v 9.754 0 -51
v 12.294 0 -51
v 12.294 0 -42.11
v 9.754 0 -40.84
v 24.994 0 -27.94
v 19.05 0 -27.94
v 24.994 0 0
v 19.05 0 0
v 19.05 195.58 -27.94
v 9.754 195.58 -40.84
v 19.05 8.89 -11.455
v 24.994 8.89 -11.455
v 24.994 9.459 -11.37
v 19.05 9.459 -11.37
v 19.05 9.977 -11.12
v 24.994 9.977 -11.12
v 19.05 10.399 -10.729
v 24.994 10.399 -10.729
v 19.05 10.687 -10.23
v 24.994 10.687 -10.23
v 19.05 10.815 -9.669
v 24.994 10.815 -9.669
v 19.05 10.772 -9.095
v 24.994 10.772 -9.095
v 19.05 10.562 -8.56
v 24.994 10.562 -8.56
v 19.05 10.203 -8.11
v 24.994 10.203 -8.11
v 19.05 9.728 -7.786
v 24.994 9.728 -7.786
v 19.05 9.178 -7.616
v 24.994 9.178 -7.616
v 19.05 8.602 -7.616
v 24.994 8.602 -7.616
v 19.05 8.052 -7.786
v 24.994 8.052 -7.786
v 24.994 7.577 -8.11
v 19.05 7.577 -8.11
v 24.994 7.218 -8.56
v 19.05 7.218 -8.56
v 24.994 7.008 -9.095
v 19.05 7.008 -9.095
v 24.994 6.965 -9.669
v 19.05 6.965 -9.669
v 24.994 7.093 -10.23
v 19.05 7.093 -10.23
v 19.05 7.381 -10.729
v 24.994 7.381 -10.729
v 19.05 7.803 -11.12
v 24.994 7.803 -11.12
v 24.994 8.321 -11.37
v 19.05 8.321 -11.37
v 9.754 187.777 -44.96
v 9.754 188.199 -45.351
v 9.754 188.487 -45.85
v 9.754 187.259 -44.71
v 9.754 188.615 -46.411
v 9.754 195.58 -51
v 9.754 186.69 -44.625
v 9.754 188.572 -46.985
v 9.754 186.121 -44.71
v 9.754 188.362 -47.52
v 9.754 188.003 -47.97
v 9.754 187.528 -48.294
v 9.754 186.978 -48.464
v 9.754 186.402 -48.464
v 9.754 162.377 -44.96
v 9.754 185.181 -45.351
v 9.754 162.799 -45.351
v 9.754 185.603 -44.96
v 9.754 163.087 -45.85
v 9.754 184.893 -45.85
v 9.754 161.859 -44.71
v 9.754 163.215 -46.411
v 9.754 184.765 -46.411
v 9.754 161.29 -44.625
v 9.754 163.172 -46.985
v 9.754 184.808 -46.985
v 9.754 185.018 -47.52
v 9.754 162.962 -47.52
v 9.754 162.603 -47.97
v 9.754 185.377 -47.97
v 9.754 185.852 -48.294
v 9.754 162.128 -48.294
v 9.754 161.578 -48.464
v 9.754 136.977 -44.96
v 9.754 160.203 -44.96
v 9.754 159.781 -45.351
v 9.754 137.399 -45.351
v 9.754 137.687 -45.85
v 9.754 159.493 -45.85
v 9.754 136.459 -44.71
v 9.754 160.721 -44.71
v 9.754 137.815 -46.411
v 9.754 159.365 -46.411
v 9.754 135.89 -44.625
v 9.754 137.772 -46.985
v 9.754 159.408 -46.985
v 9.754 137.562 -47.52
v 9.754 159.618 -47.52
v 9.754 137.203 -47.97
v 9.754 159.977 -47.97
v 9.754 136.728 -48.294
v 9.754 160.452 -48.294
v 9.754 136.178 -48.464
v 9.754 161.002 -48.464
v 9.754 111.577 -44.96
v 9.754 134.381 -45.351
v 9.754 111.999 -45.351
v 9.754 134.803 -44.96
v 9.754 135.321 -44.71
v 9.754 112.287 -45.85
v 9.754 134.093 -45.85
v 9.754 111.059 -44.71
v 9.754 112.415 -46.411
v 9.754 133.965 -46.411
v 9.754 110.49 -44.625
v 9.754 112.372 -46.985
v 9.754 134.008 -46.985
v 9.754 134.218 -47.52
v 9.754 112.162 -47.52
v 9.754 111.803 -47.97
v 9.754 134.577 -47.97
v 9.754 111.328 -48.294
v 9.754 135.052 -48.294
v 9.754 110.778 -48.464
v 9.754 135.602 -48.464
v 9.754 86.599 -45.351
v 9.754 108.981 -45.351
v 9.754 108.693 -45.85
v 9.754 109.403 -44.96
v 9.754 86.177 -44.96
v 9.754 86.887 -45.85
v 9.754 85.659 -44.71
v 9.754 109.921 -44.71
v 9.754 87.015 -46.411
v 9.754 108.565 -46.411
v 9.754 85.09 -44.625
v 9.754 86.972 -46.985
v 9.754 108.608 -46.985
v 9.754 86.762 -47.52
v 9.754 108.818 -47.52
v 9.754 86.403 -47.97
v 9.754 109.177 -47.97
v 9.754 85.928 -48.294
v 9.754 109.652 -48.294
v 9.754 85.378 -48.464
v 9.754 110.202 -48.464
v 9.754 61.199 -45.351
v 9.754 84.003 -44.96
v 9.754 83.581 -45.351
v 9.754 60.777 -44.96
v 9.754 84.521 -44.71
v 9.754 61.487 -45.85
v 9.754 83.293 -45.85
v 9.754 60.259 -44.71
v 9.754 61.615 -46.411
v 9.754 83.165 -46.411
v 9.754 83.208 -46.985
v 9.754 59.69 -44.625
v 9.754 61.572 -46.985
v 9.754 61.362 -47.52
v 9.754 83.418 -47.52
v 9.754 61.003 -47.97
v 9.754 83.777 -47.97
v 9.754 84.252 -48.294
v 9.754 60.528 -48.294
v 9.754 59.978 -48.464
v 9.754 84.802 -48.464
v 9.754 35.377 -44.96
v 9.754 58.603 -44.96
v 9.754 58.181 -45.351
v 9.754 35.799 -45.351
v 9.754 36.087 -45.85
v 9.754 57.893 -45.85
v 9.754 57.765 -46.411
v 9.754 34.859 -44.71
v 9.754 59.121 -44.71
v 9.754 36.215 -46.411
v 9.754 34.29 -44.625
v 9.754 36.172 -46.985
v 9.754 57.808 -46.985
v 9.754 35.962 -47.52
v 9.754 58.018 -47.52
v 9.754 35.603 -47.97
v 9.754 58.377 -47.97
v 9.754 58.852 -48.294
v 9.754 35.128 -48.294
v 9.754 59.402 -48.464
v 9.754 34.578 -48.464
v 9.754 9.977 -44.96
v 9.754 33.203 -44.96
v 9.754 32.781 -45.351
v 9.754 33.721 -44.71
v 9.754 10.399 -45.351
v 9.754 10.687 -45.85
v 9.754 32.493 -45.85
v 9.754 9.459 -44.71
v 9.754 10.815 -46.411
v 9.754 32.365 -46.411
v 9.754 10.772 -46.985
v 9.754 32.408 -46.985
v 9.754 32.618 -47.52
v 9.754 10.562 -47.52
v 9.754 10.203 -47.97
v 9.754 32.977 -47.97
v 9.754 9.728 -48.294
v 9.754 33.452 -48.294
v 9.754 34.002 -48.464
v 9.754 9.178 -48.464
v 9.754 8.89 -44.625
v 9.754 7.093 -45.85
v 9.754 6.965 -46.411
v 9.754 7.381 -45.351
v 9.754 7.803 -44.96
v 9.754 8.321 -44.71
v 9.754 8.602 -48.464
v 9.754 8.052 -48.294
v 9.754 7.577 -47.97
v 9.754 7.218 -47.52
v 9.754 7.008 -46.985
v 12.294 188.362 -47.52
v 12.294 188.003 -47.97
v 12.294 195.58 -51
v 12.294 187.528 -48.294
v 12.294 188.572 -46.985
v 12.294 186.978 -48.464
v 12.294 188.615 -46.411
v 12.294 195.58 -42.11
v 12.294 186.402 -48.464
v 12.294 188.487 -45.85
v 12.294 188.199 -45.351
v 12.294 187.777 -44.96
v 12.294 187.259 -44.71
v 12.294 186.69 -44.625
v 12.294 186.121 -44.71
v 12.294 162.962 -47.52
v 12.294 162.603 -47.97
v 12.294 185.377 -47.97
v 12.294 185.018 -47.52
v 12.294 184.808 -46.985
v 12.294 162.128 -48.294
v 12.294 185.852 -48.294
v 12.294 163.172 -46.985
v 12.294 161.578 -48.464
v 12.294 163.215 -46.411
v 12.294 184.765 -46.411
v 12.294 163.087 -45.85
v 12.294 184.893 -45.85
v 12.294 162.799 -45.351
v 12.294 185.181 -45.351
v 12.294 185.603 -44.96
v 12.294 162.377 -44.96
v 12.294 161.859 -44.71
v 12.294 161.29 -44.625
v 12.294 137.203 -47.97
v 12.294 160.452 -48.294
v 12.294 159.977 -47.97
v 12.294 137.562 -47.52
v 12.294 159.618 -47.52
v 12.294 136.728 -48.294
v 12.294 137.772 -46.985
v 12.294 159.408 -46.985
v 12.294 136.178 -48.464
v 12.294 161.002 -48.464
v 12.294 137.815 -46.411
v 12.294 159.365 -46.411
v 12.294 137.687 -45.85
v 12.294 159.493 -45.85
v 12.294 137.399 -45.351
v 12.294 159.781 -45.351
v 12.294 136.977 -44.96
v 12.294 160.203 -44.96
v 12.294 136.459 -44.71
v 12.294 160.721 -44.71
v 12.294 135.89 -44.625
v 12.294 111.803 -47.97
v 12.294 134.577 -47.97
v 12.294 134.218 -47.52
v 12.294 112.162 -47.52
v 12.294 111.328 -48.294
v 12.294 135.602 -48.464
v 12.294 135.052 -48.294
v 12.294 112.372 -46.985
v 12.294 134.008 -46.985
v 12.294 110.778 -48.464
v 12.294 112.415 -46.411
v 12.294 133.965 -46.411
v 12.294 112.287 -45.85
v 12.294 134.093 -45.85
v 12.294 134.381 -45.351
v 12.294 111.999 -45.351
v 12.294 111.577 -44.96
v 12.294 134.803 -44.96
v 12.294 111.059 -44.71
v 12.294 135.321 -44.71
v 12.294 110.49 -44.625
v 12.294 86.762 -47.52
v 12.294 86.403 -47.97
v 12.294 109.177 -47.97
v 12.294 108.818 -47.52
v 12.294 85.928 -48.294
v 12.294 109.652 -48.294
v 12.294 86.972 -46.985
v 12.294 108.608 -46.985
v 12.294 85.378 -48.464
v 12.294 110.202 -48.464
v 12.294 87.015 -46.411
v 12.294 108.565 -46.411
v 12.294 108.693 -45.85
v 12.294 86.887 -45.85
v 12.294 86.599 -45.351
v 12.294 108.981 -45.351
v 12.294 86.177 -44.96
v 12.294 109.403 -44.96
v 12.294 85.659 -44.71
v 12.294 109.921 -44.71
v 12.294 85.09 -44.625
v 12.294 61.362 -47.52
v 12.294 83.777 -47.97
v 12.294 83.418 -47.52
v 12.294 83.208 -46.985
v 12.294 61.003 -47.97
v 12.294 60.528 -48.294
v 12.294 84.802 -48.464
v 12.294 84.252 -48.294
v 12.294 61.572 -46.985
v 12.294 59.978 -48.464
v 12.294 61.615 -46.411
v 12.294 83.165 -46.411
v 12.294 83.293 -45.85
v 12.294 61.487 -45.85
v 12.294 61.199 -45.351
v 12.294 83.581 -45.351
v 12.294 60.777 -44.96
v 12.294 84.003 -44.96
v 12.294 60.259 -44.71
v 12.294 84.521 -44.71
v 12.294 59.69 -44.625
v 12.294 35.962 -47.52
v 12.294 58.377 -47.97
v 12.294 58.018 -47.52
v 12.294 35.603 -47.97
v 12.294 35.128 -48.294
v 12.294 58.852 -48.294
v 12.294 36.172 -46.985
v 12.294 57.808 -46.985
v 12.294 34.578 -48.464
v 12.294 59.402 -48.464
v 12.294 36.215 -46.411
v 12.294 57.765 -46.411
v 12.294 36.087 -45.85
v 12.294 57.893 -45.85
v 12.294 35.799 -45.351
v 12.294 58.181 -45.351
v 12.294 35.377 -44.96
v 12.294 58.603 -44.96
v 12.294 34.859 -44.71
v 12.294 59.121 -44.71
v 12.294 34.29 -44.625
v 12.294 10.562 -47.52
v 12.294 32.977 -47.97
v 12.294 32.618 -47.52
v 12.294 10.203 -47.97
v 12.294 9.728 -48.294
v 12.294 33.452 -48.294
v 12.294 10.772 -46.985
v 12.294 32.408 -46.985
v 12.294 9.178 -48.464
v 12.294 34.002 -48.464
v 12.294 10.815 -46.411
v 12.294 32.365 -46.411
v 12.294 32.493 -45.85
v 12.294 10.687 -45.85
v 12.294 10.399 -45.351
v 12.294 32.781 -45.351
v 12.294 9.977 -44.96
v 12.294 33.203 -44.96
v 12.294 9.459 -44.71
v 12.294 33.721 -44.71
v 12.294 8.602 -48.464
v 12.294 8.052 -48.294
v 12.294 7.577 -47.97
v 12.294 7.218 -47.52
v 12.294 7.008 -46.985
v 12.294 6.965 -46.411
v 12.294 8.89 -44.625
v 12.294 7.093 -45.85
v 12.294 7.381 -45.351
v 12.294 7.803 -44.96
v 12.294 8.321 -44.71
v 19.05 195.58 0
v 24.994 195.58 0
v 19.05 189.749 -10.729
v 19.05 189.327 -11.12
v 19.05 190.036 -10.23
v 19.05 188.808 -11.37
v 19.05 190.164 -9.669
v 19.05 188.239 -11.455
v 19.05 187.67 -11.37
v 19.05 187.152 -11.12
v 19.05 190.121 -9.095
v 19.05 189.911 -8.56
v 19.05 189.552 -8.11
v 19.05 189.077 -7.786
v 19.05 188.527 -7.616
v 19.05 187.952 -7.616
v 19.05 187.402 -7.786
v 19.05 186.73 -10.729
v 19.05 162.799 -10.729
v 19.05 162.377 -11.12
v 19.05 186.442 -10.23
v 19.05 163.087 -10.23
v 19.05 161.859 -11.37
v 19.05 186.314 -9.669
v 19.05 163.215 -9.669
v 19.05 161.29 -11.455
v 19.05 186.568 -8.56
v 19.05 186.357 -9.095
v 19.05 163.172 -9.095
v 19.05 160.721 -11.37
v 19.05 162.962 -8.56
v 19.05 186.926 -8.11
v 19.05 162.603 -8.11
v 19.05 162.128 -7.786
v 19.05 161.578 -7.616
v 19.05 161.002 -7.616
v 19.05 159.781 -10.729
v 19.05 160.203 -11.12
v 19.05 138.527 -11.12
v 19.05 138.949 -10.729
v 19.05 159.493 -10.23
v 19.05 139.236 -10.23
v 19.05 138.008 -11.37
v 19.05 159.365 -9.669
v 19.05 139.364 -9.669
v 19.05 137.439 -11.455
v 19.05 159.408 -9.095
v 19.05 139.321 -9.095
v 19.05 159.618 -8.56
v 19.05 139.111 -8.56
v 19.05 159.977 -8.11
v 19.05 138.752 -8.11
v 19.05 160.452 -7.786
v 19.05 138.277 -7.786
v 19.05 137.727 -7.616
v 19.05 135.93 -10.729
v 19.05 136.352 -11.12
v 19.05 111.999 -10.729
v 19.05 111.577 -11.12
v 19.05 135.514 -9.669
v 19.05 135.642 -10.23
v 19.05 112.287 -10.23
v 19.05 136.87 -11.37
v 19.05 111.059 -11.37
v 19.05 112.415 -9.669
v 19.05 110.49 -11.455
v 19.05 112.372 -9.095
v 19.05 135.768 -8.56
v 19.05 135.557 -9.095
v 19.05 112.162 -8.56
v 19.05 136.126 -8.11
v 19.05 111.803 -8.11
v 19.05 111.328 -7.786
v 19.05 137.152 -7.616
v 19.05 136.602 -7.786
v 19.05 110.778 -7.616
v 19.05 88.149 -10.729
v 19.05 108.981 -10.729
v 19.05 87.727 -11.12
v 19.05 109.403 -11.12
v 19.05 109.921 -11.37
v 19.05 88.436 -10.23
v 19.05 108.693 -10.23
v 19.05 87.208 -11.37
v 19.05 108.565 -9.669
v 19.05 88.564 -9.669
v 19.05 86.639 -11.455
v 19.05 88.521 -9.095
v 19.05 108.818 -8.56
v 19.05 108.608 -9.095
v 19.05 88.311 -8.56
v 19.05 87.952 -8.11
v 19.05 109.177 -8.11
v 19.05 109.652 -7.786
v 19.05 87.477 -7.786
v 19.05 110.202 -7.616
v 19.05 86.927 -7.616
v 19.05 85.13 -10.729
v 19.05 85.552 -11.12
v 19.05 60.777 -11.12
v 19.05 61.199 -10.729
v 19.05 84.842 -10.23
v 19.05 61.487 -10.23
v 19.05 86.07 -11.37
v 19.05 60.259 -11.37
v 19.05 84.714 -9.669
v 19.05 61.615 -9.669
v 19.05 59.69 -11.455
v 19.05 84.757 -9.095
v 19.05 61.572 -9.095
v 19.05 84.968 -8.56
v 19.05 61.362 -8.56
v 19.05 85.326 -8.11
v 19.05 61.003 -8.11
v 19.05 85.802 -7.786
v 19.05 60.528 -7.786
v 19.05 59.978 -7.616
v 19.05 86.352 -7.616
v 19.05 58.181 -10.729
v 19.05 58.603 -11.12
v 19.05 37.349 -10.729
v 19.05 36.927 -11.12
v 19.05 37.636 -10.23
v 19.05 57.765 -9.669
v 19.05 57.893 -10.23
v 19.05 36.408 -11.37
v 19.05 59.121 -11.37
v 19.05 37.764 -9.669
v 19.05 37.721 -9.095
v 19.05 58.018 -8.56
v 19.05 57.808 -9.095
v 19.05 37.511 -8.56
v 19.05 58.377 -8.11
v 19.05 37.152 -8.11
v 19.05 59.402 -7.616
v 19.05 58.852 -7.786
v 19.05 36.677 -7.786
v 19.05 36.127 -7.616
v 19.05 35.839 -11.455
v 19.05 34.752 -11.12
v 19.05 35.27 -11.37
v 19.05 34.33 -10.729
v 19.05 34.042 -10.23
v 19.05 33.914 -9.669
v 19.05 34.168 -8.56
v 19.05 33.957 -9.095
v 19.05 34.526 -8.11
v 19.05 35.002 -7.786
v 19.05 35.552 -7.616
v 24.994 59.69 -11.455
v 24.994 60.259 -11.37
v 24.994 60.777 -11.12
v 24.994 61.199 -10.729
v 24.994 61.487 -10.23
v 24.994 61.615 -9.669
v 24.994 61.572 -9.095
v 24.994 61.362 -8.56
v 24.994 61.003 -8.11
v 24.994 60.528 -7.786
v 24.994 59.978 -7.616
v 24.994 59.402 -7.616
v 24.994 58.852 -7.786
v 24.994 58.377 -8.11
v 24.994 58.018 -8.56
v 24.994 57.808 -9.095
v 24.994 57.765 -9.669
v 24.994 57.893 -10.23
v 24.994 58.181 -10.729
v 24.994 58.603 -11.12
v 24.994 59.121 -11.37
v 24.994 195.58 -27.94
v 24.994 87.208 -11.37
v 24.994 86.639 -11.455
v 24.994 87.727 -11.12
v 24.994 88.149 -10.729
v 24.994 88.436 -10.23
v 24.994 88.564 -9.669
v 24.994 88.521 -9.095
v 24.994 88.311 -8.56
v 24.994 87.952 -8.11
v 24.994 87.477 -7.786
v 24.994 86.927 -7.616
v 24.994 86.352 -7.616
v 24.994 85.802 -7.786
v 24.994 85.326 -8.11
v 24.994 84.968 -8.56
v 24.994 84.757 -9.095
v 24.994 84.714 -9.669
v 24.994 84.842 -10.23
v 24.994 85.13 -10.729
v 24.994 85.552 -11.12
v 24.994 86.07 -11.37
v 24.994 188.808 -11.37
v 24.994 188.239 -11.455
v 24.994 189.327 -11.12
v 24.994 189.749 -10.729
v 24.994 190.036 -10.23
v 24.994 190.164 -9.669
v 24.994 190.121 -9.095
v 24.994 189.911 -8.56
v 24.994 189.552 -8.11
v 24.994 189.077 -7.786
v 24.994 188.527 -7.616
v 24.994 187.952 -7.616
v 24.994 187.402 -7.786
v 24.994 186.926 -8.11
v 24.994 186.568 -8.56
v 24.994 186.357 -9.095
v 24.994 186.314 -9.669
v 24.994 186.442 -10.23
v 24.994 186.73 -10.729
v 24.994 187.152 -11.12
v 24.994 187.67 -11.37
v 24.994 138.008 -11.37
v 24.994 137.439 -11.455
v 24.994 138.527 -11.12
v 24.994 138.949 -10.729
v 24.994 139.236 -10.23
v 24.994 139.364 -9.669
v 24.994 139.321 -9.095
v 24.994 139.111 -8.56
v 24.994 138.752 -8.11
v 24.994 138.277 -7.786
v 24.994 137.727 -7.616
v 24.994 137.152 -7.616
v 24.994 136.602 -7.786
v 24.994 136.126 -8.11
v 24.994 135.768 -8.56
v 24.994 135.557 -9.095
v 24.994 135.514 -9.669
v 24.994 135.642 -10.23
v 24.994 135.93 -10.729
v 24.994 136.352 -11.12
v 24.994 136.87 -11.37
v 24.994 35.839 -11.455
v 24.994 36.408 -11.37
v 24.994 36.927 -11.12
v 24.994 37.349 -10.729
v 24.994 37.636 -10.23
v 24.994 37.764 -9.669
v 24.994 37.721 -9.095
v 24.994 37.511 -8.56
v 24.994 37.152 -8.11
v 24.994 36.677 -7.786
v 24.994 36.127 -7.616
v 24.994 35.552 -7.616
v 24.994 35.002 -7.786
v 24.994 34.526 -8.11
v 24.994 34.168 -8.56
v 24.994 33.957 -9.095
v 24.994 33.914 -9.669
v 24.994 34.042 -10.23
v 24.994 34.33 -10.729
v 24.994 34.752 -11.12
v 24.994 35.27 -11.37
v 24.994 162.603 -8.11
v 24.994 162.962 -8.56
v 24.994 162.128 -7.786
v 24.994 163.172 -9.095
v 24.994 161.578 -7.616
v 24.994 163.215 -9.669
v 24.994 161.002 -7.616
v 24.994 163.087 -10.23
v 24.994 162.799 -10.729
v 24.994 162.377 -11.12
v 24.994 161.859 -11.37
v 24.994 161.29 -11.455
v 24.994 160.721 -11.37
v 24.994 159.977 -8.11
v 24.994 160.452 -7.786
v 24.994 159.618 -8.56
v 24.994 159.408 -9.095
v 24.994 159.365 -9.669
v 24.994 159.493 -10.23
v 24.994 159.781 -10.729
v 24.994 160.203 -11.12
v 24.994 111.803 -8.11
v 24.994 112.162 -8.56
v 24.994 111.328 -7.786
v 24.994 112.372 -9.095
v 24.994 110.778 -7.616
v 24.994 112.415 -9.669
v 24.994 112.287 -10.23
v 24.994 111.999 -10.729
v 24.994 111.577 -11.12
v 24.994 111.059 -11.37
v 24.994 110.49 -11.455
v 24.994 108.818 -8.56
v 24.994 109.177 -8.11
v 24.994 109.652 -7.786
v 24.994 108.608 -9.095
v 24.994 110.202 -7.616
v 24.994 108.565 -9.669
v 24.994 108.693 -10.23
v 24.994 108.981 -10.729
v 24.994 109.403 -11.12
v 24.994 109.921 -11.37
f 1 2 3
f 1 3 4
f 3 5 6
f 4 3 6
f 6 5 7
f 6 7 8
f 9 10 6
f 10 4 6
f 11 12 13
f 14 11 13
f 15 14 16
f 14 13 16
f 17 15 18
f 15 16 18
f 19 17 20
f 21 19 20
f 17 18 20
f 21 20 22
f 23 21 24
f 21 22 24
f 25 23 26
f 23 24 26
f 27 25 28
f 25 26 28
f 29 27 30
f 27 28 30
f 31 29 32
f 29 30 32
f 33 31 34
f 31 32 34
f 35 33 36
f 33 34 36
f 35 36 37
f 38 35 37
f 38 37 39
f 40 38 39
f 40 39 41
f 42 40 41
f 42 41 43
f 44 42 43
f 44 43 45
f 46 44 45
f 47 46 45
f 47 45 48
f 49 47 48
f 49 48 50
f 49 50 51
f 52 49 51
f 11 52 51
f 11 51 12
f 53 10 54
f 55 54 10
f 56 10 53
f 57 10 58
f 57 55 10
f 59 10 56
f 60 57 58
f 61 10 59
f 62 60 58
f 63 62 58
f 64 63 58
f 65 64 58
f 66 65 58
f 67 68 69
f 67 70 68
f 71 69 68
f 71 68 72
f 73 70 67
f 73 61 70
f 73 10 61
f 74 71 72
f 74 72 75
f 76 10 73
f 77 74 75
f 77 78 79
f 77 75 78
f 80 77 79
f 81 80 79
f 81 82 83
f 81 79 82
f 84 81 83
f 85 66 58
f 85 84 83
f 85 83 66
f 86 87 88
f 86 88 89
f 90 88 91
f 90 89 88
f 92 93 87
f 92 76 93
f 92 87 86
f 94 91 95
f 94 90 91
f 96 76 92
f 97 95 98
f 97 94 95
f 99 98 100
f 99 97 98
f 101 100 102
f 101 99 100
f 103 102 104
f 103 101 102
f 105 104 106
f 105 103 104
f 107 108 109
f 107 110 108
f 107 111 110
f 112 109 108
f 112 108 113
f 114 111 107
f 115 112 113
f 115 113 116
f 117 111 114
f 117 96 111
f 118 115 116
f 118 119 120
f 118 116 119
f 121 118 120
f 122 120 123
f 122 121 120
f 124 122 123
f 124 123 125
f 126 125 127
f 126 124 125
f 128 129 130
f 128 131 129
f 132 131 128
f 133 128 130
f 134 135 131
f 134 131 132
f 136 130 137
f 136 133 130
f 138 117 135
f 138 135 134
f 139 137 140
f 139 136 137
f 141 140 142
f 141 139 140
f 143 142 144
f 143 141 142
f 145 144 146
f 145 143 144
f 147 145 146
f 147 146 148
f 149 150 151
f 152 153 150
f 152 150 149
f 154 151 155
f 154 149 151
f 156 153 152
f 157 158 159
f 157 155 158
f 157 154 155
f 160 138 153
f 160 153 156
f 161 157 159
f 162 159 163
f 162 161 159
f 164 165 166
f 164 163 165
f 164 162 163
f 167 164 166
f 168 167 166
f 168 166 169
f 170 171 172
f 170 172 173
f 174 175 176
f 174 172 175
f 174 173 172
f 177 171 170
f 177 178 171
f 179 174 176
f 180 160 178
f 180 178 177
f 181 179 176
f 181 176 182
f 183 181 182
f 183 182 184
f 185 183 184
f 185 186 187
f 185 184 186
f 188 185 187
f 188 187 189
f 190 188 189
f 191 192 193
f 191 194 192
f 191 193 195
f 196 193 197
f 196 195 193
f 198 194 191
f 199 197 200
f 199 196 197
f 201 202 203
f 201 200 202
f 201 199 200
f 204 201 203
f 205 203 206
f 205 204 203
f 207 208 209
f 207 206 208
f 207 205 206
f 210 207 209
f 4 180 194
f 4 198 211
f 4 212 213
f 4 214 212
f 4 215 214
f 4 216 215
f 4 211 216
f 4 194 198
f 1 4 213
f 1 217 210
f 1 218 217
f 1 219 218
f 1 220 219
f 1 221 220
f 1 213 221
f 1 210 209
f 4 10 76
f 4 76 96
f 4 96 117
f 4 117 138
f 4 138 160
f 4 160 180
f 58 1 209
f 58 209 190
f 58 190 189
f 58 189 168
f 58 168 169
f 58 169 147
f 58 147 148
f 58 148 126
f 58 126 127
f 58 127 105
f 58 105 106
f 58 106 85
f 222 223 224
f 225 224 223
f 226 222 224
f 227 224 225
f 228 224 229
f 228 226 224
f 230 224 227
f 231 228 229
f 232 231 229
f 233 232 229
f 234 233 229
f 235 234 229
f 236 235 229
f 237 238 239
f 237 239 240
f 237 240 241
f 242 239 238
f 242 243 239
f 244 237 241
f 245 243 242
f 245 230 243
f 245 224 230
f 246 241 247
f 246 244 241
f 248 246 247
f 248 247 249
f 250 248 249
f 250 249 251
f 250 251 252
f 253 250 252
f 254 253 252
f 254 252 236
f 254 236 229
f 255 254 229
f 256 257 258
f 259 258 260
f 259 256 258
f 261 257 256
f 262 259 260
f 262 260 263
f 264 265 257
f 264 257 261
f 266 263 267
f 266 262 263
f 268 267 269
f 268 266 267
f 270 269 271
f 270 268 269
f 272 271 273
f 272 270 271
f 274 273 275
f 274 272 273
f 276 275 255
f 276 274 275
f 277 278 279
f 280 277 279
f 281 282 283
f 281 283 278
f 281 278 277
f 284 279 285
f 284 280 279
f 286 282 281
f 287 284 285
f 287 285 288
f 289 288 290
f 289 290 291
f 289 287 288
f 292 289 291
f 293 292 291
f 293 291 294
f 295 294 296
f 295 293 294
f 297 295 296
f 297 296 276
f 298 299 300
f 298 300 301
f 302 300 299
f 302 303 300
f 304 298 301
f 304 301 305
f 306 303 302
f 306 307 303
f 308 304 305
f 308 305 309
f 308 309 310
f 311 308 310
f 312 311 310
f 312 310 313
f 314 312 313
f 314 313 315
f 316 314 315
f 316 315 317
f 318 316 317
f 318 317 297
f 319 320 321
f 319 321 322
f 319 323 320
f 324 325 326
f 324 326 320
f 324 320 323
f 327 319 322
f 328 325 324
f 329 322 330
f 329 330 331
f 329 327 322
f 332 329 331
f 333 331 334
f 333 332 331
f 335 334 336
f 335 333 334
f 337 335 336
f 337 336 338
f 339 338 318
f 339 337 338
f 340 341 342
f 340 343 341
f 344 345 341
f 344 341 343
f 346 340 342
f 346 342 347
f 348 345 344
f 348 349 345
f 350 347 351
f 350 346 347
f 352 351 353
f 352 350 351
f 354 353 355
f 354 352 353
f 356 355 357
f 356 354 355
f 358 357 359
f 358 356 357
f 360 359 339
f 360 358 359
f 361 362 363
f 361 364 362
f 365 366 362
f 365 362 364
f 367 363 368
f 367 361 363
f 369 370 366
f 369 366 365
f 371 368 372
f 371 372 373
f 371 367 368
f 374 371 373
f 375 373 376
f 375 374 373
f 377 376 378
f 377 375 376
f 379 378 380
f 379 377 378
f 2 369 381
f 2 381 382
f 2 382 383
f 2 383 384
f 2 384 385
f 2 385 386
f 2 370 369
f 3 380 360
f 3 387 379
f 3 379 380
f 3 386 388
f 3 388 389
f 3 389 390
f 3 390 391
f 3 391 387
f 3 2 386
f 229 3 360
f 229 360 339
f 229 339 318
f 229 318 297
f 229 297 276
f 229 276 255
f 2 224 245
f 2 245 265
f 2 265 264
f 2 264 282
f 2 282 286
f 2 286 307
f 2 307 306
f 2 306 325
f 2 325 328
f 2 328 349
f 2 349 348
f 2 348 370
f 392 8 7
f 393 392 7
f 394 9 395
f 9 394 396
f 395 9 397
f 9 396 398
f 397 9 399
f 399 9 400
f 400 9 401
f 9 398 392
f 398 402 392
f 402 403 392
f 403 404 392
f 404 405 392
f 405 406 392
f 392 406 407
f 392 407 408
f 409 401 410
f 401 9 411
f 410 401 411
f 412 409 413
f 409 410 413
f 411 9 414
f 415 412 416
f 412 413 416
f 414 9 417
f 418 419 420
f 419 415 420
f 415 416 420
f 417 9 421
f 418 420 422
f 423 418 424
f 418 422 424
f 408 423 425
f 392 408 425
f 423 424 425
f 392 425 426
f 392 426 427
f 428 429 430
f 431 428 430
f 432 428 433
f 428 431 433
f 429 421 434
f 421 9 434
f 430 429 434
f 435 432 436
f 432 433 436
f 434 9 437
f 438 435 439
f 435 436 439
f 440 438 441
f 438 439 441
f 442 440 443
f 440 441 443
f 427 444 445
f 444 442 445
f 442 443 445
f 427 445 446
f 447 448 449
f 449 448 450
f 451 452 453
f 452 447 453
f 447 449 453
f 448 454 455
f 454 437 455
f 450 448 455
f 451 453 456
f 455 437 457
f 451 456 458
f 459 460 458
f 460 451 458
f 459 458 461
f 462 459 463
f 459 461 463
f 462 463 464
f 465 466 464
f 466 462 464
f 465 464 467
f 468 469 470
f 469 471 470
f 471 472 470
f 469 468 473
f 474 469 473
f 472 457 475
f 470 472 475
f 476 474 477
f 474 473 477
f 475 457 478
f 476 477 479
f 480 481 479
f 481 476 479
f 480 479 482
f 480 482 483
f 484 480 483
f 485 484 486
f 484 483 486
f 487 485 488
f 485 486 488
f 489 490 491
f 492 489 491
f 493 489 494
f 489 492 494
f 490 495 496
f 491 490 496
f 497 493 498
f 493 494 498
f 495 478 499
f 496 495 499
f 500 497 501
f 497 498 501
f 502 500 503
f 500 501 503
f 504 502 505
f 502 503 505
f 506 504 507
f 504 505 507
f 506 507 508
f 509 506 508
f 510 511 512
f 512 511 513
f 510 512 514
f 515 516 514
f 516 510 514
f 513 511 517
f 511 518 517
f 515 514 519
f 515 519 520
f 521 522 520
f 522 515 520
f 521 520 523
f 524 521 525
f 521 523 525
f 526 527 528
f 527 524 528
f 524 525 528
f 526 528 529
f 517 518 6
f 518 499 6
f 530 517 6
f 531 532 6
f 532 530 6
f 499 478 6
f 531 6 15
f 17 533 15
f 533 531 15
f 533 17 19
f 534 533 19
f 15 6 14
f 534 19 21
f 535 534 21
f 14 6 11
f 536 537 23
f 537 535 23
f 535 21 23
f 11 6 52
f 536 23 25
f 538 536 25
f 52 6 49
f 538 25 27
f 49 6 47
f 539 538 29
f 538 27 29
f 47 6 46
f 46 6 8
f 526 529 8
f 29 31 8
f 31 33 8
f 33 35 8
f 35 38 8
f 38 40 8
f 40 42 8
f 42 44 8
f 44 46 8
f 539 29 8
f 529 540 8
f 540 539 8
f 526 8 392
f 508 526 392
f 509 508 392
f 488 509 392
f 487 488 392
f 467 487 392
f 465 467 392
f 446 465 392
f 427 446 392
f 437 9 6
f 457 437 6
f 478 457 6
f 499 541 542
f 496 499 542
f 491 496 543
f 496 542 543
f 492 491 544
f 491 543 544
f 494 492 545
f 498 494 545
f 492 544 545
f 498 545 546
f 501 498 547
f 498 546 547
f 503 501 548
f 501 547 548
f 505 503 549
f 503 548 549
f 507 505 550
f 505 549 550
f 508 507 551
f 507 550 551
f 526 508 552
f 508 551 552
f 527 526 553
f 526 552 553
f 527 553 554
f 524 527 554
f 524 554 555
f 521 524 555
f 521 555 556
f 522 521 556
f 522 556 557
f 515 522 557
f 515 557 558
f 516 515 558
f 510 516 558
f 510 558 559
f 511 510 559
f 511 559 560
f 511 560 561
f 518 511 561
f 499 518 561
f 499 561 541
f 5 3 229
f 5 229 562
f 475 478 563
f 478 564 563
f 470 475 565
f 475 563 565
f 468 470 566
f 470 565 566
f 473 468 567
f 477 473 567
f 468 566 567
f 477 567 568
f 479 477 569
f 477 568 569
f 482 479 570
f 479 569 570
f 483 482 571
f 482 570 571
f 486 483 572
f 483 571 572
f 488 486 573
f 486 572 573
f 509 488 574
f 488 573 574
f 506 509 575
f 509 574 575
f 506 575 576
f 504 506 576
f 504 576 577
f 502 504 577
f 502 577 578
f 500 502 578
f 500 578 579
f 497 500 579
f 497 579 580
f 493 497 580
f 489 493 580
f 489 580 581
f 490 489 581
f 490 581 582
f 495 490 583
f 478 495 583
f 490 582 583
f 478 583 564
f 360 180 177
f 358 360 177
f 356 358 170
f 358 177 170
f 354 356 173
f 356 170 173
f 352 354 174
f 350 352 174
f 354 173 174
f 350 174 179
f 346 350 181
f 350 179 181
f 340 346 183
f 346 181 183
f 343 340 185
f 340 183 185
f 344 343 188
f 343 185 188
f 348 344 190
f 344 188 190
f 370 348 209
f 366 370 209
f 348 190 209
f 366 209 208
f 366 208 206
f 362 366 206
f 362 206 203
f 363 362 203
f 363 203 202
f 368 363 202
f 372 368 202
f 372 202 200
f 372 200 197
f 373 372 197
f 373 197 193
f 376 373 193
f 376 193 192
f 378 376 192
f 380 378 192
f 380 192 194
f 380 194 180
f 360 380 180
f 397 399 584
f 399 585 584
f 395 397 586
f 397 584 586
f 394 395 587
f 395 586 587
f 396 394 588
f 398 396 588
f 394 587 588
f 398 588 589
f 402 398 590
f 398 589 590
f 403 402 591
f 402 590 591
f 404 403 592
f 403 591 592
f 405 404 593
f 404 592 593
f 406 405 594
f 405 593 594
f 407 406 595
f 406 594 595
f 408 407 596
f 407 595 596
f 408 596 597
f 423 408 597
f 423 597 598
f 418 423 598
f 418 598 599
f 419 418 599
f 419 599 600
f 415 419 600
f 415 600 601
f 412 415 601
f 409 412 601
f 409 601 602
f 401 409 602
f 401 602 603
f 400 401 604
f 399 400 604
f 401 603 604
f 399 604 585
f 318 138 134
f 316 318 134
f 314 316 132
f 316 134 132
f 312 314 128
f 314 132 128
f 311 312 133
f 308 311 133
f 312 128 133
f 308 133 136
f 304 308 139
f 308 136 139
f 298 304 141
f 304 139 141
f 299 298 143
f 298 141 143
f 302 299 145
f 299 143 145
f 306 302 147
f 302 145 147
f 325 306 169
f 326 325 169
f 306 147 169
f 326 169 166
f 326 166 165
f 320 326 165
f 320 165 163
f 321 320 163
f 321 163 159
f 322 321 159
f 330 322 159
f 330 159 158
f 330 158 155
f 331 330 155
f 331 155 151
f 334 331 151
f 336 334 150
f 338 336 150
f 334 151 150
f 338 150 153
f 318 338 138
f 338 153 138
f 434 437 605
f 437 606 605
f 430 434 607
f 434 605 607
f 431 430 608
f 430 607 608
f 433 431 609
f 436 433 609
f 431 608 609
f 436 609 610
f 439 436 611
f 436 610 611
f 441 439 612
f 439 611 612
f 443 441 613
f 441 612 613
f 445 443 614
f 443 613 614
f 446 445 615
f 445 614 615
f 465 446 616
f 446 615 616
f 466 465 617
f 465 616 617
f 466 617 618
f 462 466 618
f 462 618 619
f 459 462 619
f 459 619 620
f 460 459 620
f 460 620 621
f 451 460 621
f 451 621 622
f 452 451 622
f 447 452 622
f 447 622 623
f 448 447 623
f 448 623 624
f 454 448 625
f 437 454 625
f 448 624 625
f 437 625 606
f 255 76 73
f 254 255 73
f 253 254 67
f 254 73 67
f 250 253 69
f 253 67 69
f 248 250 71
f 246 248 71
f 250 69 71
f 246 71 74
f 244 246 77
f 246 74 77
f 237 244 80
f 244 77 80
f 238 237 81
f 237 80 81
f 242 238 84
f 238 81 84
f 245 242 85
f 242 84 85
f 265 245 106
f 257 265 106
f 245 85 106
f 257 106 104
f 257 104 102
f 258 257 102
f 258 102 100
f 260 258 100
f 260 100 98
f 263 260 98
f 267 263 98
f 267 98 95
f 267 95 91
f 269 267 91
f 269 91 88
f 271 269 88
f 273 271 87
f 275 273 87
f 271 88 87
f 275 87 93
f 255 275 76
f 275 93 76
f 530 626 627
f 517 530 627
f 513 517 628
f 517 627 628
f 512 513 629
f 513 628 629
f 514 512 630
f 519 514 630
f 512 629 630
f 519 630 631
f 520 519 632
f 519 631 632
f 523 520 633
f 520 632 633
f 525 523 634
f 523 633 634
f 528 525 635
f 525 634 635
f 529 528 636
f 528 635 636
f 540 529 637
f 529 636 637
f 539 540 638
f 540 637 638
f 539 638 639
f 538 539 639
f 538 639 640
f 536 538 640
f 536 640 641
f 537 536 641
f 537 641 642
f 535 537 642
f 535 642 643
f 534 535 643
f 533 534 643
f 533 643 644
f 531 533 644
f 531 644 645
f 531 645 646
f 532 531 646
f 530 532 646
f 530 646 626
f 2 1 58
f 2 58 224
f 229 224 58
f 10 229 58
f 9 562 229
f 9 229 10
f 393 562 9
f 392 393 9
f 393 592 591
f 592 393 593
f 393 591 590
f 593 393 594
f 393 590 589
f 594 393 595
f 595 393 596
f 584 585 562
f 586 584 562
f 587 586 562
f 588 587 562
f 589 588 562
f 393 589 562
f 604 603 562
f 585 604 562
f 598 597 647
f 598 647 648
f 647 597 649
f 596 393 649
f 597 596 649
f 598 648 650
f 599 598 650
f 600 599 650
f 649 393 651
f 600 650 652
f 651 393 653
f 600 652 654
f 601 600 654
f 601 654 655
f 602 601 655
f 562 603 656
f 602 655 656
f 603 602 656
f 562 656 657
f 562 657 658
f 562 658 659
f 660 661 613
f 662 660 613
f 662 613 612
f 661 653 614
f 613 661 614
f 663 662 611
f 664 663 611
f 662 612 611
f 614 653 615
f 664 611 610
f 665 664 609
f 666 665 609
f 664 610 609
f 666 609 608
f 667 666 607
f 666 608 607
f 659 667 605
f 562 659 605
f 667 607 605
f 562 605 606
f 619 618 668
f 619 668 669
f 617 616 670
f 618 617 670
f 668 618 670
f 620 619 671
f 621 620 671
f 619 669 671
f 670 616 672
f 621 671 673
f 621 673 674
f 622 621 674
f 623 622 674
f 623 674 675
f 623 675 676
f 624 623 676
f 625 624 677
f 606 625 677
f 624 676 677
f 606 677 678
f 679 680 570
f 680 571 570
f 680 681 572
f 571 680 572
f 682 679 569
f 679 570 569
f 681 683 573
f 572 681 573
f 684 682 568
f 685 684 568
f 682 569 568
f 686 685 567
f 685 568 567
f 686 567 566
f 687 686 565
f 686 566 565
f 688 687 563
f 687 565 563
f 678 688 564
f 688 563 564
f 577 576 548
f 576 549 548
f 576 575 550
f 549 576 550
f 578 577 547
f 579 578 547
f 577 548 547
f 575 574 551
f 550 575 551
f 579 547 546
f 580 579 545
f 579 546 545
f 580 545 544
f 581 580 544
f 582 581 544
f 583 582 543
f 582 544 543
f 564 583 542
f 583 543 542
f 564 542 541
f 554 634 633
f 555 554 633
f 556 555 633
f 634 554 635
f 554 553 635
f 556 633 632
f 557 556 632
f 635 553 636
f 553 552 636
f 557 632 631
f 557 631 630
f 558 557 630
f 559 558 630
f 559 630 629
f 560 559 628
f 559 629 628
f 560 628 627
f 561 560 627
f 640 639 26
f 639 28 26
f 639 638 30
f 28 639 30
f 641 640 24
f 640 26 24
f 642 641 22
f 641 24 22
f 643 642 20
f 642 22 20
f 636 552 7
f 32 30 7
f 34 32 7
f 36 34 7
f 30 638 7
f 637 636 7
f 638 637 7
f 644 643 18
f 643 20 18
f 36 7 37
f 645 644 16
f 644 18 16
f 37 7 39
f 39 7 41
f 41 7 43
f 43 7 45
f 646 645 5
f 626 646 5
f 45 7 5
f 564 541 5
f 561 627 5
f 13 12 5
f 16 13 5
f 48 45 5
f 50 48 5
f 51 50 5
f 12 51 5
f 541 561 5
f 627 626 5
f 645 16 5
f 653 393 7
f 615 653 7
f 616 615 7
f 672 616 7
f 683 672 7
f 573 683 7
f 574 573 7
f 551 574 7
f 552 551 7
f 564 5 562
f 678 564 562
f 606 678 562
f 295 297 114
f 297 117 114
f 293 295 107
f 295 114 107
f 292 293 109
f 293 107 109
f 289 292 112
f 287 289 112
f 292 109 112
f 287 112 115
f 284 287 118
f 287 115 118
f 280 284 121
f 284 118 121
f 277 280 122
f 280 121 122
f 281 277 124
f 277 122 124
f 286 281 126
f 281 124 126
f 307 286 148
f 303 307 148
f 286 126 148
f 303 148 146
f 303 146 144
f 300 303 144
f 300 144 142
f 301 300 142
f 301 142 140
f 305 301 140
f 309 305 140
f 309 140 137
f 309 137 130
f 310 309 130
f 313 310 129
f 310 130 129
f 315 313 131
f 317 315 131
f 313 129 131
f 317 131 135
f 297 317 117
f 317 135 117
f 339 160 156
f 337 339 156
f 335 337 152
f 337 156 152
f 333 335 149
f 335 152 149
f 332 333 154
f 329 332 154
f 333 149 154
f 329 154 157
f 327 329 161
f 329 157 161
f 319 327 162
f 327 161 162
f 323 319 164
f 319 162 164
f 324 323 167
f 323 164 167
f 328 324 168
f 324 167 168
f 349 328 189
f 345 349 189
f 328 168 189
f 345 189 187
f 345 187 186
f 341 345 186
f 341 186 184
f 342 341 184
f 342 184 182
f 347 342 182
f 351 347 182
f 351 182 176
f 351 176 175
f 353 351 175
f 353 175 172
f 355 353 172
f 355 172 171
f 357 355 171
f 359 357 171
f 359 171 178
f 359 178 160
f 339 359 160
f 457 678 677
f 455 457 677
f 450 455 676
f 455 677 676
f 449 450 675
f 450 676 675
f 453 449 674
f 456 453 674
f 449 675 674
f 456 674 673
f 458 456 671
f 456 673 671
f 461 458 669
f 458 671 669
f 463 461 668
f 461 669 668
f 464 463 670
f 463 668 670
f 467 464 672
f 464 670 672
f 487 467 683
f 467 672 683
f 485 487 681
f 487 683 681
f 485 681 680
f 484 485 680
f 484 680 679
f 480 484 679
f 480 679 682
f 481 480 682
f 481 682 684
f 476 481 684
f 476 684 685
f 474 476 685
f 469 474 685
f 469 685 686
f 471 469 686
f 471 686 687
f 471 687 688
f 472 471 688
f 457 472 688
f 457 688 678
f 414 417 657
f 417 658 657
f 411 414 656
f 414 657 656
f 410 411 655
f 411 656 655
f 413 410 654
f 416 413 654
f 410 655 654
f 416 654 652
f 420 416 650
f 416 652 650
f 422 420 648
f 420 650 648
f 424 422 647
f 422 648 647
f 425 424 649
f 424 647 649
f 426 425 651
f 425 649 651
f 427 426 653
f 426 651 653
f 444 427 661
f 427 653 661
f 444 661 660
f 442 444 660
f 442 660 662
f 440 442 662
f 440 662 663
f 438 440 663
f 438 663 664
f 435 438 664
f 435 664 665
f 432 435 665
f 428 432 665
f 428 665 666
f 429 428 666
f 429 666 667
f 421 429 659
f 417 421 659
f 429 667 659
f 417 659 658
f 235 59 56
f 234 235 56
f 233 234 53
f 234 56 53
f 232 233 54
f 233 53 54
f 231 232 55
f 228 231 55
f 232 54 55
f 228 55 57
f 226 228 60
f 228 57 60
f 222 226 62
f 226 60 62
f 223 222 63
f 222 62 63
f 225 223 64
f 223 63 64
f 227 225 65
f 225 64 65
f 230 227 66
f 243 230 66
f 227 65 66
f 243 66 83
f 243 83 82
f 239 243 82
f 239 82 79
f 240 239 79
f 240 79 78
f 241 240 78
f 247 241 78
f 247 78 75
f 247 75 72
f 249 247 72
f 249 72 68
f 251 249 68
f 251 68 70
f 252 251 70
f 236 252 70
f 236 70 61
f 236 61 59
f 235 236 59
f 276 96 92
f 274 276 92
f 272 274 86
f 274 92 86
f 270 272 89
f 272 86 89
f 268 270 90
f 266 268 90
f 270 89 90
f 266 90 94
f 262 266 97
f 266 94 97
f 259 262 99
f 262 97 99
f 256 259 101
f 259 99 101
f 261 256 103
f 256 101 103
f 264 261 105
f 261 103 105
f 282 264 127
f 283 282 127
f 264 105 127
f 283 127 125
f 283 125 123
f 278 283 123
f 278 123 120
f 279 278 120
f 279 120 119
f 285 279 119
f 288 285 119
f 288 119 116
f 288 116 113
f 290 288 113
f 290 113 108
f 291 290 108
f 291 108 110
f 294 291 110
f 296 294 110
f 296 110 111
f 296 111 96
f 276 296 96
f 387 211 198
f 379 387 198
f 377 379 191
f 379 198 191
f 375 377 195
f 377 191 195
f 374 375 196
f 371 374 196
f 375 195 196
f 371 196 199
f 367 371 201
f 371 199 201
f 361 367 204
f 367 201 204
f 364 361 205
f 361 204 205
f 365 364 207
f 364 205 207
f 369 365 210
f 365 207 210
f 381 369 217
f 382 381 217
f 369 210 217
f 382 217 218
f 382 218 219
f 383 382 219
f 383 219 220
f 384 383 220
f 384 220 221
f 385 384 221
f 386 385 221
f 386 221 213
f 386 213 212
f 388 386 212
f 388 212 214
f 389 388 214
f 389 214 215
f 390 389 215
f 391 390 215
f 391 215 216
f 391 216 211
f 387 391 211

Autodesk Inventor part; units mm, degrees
ref_plane "YZ Plane" through (0, 0, 0) normal (1, 0, 0) x (0, 1, 0)
ref_plane "XZ Plane" through (0, 0, 0) normal (0, 1, 0) x (-1, 0, 0)
ref_plane "XY Plane" through (0, 0, 0) normal (0, 0, 1) x (1, 0, 0)
sketch "Sketch1" plane through (0, 0, 0) normal (0, 1, 0) x (-1, 0, 0)
  line L0 (0, 0) -> (-19.05, 0) construction
  line L1 (-19.05, 0) -> (-19.05, -19.05) construction
  line L2 (-19.05, -19.05) -> (0, -19.05) construction
  line L3 (0, -19.05) -> (0, 0) construction
  line L4 (0, 0) -> (279.4, 0) construction
  line L5 (279.4, 0) -> (279.4, -35.5) construction
  line L6 (279.4, -35.5) -> (0, -35.5) construction
  line L7 (0, -35.5) -> (0, 0) construction
  line L8 (-47.8536, 0) -> (-47.8536, -76.2) construction
  line L9 (-19.05, 0) -> (-24.9936, 0)
  line L10 (-24.9936, 0) -> (-24.9936, -27.94)
  line L11 (-24.9936, -27.94) -> (-19.05, -27.94)
  line L12 (-19.05, -27.94) -> (-19.05, 0)
  line L13 (-9.7536, -51) -> (-12.2936, -51)
  line L14 (-12.2936, -51) -> (-12.2936, -42.11)
  line L15 (-9.7536, -40.84) -> (-9.7536, -51)
  line L16 (-9.7536, -40.84) -> (-19.05, -27.94)
  line L17 (-9.7536, -42.11) -> (-12.2936, -42.11) construction
  line L18 (-12.2936, -42.11) -> (-24.9936, -27.94)
  dimension "d0" = 19.05
  dimension "d1" = 19.05
  dimension "d2" = 279.4
  dimension "d3" = 35.5
  dimension "d4" = 76.2
  dimension "d5" = 28.8036
  dimension "d6" = 38.1
  dimension "d7" = 51
  dimension "d8" = 5.9436
  dimension "d9" = 27.94
  dimension "d12" = 8.89
extrude "Extrusion1" add sketch "Sketch1" along normal blind 195.58
sketch "Sketch2" plane through (24.9936, 0, 0) normal (1, 0, 0) x (0, 0, -1)
  circle A0 centre (9.525, 8.89) radius 1.9304
  circle A1 centre (9.525, 35.8394) radius 1.9304
  line L0 (0, 0) -> (27.94, 0) projected
  line L1 (0, 0) -> (0, 195.58) projected
  circle A2 centre (9.525, 86.6394) radius 1.9304
  circle A3 centre (9.525, 59.69) radius 1.9304
  circle A4 centre (9.525, 137.4394) radius 1.9304
  circle A5 centre (9.525, 110.49) radius 1.9304
  circle A6 centre (9.525, 188.2394) radius 1.9304
  circle A7 centre (9.525, 161.29) radius 1.9304
  dimension "d16" = 3.8608
  dimension "d17" = 3.8608
  dimension "d18" = 26.9494
  dimension "d19" = 8.89
  dimension "d20" = 9.525
  dimension "d21" = 9.525
  dimension "d24" = 50.8
extrude "Extrusion2" cut sketch "Sketch2" against normal blind 195.58
sketch "Sketch3" plane through (9.7536, 0, -51) normal (-1, 0, 0) x (0, 0, 1)
  circle A0 centre (4.445, 8.89) radius 1.9304
  line L0 (0, 0) -> (0, 195.58) projected
  line L1 (0, 0) -> (10.16, 0) projected
  circle A1 centre (4.445, 34.29) radius 1.9304
  circle A2 centre (4.445, 59.69) radius 1.9304
  circle A3 centre (4.445, 85.09) radius 1.9304
  circle A4 centre (4.445, 110.49) radius 1.9304
  circle A5 centre (4.445, 135.89) radius 1.9304
  circle A6 centre (4.445, 161.29) radius 1.9304
  circle A7 centre (4.445, 186.69) radius 1.9304
  point P0 (51, 0)
  dimension "d31" = 3.8608
  dimension "d32" = 4.445
  dimension "d33" = 8.89
  dimension "d36" = 25.4
extrude "Extrusion3" cut sketch "Sketch3" against normal through all
equation "\"d21\" = d20"
properties part number "intake guide mount"
